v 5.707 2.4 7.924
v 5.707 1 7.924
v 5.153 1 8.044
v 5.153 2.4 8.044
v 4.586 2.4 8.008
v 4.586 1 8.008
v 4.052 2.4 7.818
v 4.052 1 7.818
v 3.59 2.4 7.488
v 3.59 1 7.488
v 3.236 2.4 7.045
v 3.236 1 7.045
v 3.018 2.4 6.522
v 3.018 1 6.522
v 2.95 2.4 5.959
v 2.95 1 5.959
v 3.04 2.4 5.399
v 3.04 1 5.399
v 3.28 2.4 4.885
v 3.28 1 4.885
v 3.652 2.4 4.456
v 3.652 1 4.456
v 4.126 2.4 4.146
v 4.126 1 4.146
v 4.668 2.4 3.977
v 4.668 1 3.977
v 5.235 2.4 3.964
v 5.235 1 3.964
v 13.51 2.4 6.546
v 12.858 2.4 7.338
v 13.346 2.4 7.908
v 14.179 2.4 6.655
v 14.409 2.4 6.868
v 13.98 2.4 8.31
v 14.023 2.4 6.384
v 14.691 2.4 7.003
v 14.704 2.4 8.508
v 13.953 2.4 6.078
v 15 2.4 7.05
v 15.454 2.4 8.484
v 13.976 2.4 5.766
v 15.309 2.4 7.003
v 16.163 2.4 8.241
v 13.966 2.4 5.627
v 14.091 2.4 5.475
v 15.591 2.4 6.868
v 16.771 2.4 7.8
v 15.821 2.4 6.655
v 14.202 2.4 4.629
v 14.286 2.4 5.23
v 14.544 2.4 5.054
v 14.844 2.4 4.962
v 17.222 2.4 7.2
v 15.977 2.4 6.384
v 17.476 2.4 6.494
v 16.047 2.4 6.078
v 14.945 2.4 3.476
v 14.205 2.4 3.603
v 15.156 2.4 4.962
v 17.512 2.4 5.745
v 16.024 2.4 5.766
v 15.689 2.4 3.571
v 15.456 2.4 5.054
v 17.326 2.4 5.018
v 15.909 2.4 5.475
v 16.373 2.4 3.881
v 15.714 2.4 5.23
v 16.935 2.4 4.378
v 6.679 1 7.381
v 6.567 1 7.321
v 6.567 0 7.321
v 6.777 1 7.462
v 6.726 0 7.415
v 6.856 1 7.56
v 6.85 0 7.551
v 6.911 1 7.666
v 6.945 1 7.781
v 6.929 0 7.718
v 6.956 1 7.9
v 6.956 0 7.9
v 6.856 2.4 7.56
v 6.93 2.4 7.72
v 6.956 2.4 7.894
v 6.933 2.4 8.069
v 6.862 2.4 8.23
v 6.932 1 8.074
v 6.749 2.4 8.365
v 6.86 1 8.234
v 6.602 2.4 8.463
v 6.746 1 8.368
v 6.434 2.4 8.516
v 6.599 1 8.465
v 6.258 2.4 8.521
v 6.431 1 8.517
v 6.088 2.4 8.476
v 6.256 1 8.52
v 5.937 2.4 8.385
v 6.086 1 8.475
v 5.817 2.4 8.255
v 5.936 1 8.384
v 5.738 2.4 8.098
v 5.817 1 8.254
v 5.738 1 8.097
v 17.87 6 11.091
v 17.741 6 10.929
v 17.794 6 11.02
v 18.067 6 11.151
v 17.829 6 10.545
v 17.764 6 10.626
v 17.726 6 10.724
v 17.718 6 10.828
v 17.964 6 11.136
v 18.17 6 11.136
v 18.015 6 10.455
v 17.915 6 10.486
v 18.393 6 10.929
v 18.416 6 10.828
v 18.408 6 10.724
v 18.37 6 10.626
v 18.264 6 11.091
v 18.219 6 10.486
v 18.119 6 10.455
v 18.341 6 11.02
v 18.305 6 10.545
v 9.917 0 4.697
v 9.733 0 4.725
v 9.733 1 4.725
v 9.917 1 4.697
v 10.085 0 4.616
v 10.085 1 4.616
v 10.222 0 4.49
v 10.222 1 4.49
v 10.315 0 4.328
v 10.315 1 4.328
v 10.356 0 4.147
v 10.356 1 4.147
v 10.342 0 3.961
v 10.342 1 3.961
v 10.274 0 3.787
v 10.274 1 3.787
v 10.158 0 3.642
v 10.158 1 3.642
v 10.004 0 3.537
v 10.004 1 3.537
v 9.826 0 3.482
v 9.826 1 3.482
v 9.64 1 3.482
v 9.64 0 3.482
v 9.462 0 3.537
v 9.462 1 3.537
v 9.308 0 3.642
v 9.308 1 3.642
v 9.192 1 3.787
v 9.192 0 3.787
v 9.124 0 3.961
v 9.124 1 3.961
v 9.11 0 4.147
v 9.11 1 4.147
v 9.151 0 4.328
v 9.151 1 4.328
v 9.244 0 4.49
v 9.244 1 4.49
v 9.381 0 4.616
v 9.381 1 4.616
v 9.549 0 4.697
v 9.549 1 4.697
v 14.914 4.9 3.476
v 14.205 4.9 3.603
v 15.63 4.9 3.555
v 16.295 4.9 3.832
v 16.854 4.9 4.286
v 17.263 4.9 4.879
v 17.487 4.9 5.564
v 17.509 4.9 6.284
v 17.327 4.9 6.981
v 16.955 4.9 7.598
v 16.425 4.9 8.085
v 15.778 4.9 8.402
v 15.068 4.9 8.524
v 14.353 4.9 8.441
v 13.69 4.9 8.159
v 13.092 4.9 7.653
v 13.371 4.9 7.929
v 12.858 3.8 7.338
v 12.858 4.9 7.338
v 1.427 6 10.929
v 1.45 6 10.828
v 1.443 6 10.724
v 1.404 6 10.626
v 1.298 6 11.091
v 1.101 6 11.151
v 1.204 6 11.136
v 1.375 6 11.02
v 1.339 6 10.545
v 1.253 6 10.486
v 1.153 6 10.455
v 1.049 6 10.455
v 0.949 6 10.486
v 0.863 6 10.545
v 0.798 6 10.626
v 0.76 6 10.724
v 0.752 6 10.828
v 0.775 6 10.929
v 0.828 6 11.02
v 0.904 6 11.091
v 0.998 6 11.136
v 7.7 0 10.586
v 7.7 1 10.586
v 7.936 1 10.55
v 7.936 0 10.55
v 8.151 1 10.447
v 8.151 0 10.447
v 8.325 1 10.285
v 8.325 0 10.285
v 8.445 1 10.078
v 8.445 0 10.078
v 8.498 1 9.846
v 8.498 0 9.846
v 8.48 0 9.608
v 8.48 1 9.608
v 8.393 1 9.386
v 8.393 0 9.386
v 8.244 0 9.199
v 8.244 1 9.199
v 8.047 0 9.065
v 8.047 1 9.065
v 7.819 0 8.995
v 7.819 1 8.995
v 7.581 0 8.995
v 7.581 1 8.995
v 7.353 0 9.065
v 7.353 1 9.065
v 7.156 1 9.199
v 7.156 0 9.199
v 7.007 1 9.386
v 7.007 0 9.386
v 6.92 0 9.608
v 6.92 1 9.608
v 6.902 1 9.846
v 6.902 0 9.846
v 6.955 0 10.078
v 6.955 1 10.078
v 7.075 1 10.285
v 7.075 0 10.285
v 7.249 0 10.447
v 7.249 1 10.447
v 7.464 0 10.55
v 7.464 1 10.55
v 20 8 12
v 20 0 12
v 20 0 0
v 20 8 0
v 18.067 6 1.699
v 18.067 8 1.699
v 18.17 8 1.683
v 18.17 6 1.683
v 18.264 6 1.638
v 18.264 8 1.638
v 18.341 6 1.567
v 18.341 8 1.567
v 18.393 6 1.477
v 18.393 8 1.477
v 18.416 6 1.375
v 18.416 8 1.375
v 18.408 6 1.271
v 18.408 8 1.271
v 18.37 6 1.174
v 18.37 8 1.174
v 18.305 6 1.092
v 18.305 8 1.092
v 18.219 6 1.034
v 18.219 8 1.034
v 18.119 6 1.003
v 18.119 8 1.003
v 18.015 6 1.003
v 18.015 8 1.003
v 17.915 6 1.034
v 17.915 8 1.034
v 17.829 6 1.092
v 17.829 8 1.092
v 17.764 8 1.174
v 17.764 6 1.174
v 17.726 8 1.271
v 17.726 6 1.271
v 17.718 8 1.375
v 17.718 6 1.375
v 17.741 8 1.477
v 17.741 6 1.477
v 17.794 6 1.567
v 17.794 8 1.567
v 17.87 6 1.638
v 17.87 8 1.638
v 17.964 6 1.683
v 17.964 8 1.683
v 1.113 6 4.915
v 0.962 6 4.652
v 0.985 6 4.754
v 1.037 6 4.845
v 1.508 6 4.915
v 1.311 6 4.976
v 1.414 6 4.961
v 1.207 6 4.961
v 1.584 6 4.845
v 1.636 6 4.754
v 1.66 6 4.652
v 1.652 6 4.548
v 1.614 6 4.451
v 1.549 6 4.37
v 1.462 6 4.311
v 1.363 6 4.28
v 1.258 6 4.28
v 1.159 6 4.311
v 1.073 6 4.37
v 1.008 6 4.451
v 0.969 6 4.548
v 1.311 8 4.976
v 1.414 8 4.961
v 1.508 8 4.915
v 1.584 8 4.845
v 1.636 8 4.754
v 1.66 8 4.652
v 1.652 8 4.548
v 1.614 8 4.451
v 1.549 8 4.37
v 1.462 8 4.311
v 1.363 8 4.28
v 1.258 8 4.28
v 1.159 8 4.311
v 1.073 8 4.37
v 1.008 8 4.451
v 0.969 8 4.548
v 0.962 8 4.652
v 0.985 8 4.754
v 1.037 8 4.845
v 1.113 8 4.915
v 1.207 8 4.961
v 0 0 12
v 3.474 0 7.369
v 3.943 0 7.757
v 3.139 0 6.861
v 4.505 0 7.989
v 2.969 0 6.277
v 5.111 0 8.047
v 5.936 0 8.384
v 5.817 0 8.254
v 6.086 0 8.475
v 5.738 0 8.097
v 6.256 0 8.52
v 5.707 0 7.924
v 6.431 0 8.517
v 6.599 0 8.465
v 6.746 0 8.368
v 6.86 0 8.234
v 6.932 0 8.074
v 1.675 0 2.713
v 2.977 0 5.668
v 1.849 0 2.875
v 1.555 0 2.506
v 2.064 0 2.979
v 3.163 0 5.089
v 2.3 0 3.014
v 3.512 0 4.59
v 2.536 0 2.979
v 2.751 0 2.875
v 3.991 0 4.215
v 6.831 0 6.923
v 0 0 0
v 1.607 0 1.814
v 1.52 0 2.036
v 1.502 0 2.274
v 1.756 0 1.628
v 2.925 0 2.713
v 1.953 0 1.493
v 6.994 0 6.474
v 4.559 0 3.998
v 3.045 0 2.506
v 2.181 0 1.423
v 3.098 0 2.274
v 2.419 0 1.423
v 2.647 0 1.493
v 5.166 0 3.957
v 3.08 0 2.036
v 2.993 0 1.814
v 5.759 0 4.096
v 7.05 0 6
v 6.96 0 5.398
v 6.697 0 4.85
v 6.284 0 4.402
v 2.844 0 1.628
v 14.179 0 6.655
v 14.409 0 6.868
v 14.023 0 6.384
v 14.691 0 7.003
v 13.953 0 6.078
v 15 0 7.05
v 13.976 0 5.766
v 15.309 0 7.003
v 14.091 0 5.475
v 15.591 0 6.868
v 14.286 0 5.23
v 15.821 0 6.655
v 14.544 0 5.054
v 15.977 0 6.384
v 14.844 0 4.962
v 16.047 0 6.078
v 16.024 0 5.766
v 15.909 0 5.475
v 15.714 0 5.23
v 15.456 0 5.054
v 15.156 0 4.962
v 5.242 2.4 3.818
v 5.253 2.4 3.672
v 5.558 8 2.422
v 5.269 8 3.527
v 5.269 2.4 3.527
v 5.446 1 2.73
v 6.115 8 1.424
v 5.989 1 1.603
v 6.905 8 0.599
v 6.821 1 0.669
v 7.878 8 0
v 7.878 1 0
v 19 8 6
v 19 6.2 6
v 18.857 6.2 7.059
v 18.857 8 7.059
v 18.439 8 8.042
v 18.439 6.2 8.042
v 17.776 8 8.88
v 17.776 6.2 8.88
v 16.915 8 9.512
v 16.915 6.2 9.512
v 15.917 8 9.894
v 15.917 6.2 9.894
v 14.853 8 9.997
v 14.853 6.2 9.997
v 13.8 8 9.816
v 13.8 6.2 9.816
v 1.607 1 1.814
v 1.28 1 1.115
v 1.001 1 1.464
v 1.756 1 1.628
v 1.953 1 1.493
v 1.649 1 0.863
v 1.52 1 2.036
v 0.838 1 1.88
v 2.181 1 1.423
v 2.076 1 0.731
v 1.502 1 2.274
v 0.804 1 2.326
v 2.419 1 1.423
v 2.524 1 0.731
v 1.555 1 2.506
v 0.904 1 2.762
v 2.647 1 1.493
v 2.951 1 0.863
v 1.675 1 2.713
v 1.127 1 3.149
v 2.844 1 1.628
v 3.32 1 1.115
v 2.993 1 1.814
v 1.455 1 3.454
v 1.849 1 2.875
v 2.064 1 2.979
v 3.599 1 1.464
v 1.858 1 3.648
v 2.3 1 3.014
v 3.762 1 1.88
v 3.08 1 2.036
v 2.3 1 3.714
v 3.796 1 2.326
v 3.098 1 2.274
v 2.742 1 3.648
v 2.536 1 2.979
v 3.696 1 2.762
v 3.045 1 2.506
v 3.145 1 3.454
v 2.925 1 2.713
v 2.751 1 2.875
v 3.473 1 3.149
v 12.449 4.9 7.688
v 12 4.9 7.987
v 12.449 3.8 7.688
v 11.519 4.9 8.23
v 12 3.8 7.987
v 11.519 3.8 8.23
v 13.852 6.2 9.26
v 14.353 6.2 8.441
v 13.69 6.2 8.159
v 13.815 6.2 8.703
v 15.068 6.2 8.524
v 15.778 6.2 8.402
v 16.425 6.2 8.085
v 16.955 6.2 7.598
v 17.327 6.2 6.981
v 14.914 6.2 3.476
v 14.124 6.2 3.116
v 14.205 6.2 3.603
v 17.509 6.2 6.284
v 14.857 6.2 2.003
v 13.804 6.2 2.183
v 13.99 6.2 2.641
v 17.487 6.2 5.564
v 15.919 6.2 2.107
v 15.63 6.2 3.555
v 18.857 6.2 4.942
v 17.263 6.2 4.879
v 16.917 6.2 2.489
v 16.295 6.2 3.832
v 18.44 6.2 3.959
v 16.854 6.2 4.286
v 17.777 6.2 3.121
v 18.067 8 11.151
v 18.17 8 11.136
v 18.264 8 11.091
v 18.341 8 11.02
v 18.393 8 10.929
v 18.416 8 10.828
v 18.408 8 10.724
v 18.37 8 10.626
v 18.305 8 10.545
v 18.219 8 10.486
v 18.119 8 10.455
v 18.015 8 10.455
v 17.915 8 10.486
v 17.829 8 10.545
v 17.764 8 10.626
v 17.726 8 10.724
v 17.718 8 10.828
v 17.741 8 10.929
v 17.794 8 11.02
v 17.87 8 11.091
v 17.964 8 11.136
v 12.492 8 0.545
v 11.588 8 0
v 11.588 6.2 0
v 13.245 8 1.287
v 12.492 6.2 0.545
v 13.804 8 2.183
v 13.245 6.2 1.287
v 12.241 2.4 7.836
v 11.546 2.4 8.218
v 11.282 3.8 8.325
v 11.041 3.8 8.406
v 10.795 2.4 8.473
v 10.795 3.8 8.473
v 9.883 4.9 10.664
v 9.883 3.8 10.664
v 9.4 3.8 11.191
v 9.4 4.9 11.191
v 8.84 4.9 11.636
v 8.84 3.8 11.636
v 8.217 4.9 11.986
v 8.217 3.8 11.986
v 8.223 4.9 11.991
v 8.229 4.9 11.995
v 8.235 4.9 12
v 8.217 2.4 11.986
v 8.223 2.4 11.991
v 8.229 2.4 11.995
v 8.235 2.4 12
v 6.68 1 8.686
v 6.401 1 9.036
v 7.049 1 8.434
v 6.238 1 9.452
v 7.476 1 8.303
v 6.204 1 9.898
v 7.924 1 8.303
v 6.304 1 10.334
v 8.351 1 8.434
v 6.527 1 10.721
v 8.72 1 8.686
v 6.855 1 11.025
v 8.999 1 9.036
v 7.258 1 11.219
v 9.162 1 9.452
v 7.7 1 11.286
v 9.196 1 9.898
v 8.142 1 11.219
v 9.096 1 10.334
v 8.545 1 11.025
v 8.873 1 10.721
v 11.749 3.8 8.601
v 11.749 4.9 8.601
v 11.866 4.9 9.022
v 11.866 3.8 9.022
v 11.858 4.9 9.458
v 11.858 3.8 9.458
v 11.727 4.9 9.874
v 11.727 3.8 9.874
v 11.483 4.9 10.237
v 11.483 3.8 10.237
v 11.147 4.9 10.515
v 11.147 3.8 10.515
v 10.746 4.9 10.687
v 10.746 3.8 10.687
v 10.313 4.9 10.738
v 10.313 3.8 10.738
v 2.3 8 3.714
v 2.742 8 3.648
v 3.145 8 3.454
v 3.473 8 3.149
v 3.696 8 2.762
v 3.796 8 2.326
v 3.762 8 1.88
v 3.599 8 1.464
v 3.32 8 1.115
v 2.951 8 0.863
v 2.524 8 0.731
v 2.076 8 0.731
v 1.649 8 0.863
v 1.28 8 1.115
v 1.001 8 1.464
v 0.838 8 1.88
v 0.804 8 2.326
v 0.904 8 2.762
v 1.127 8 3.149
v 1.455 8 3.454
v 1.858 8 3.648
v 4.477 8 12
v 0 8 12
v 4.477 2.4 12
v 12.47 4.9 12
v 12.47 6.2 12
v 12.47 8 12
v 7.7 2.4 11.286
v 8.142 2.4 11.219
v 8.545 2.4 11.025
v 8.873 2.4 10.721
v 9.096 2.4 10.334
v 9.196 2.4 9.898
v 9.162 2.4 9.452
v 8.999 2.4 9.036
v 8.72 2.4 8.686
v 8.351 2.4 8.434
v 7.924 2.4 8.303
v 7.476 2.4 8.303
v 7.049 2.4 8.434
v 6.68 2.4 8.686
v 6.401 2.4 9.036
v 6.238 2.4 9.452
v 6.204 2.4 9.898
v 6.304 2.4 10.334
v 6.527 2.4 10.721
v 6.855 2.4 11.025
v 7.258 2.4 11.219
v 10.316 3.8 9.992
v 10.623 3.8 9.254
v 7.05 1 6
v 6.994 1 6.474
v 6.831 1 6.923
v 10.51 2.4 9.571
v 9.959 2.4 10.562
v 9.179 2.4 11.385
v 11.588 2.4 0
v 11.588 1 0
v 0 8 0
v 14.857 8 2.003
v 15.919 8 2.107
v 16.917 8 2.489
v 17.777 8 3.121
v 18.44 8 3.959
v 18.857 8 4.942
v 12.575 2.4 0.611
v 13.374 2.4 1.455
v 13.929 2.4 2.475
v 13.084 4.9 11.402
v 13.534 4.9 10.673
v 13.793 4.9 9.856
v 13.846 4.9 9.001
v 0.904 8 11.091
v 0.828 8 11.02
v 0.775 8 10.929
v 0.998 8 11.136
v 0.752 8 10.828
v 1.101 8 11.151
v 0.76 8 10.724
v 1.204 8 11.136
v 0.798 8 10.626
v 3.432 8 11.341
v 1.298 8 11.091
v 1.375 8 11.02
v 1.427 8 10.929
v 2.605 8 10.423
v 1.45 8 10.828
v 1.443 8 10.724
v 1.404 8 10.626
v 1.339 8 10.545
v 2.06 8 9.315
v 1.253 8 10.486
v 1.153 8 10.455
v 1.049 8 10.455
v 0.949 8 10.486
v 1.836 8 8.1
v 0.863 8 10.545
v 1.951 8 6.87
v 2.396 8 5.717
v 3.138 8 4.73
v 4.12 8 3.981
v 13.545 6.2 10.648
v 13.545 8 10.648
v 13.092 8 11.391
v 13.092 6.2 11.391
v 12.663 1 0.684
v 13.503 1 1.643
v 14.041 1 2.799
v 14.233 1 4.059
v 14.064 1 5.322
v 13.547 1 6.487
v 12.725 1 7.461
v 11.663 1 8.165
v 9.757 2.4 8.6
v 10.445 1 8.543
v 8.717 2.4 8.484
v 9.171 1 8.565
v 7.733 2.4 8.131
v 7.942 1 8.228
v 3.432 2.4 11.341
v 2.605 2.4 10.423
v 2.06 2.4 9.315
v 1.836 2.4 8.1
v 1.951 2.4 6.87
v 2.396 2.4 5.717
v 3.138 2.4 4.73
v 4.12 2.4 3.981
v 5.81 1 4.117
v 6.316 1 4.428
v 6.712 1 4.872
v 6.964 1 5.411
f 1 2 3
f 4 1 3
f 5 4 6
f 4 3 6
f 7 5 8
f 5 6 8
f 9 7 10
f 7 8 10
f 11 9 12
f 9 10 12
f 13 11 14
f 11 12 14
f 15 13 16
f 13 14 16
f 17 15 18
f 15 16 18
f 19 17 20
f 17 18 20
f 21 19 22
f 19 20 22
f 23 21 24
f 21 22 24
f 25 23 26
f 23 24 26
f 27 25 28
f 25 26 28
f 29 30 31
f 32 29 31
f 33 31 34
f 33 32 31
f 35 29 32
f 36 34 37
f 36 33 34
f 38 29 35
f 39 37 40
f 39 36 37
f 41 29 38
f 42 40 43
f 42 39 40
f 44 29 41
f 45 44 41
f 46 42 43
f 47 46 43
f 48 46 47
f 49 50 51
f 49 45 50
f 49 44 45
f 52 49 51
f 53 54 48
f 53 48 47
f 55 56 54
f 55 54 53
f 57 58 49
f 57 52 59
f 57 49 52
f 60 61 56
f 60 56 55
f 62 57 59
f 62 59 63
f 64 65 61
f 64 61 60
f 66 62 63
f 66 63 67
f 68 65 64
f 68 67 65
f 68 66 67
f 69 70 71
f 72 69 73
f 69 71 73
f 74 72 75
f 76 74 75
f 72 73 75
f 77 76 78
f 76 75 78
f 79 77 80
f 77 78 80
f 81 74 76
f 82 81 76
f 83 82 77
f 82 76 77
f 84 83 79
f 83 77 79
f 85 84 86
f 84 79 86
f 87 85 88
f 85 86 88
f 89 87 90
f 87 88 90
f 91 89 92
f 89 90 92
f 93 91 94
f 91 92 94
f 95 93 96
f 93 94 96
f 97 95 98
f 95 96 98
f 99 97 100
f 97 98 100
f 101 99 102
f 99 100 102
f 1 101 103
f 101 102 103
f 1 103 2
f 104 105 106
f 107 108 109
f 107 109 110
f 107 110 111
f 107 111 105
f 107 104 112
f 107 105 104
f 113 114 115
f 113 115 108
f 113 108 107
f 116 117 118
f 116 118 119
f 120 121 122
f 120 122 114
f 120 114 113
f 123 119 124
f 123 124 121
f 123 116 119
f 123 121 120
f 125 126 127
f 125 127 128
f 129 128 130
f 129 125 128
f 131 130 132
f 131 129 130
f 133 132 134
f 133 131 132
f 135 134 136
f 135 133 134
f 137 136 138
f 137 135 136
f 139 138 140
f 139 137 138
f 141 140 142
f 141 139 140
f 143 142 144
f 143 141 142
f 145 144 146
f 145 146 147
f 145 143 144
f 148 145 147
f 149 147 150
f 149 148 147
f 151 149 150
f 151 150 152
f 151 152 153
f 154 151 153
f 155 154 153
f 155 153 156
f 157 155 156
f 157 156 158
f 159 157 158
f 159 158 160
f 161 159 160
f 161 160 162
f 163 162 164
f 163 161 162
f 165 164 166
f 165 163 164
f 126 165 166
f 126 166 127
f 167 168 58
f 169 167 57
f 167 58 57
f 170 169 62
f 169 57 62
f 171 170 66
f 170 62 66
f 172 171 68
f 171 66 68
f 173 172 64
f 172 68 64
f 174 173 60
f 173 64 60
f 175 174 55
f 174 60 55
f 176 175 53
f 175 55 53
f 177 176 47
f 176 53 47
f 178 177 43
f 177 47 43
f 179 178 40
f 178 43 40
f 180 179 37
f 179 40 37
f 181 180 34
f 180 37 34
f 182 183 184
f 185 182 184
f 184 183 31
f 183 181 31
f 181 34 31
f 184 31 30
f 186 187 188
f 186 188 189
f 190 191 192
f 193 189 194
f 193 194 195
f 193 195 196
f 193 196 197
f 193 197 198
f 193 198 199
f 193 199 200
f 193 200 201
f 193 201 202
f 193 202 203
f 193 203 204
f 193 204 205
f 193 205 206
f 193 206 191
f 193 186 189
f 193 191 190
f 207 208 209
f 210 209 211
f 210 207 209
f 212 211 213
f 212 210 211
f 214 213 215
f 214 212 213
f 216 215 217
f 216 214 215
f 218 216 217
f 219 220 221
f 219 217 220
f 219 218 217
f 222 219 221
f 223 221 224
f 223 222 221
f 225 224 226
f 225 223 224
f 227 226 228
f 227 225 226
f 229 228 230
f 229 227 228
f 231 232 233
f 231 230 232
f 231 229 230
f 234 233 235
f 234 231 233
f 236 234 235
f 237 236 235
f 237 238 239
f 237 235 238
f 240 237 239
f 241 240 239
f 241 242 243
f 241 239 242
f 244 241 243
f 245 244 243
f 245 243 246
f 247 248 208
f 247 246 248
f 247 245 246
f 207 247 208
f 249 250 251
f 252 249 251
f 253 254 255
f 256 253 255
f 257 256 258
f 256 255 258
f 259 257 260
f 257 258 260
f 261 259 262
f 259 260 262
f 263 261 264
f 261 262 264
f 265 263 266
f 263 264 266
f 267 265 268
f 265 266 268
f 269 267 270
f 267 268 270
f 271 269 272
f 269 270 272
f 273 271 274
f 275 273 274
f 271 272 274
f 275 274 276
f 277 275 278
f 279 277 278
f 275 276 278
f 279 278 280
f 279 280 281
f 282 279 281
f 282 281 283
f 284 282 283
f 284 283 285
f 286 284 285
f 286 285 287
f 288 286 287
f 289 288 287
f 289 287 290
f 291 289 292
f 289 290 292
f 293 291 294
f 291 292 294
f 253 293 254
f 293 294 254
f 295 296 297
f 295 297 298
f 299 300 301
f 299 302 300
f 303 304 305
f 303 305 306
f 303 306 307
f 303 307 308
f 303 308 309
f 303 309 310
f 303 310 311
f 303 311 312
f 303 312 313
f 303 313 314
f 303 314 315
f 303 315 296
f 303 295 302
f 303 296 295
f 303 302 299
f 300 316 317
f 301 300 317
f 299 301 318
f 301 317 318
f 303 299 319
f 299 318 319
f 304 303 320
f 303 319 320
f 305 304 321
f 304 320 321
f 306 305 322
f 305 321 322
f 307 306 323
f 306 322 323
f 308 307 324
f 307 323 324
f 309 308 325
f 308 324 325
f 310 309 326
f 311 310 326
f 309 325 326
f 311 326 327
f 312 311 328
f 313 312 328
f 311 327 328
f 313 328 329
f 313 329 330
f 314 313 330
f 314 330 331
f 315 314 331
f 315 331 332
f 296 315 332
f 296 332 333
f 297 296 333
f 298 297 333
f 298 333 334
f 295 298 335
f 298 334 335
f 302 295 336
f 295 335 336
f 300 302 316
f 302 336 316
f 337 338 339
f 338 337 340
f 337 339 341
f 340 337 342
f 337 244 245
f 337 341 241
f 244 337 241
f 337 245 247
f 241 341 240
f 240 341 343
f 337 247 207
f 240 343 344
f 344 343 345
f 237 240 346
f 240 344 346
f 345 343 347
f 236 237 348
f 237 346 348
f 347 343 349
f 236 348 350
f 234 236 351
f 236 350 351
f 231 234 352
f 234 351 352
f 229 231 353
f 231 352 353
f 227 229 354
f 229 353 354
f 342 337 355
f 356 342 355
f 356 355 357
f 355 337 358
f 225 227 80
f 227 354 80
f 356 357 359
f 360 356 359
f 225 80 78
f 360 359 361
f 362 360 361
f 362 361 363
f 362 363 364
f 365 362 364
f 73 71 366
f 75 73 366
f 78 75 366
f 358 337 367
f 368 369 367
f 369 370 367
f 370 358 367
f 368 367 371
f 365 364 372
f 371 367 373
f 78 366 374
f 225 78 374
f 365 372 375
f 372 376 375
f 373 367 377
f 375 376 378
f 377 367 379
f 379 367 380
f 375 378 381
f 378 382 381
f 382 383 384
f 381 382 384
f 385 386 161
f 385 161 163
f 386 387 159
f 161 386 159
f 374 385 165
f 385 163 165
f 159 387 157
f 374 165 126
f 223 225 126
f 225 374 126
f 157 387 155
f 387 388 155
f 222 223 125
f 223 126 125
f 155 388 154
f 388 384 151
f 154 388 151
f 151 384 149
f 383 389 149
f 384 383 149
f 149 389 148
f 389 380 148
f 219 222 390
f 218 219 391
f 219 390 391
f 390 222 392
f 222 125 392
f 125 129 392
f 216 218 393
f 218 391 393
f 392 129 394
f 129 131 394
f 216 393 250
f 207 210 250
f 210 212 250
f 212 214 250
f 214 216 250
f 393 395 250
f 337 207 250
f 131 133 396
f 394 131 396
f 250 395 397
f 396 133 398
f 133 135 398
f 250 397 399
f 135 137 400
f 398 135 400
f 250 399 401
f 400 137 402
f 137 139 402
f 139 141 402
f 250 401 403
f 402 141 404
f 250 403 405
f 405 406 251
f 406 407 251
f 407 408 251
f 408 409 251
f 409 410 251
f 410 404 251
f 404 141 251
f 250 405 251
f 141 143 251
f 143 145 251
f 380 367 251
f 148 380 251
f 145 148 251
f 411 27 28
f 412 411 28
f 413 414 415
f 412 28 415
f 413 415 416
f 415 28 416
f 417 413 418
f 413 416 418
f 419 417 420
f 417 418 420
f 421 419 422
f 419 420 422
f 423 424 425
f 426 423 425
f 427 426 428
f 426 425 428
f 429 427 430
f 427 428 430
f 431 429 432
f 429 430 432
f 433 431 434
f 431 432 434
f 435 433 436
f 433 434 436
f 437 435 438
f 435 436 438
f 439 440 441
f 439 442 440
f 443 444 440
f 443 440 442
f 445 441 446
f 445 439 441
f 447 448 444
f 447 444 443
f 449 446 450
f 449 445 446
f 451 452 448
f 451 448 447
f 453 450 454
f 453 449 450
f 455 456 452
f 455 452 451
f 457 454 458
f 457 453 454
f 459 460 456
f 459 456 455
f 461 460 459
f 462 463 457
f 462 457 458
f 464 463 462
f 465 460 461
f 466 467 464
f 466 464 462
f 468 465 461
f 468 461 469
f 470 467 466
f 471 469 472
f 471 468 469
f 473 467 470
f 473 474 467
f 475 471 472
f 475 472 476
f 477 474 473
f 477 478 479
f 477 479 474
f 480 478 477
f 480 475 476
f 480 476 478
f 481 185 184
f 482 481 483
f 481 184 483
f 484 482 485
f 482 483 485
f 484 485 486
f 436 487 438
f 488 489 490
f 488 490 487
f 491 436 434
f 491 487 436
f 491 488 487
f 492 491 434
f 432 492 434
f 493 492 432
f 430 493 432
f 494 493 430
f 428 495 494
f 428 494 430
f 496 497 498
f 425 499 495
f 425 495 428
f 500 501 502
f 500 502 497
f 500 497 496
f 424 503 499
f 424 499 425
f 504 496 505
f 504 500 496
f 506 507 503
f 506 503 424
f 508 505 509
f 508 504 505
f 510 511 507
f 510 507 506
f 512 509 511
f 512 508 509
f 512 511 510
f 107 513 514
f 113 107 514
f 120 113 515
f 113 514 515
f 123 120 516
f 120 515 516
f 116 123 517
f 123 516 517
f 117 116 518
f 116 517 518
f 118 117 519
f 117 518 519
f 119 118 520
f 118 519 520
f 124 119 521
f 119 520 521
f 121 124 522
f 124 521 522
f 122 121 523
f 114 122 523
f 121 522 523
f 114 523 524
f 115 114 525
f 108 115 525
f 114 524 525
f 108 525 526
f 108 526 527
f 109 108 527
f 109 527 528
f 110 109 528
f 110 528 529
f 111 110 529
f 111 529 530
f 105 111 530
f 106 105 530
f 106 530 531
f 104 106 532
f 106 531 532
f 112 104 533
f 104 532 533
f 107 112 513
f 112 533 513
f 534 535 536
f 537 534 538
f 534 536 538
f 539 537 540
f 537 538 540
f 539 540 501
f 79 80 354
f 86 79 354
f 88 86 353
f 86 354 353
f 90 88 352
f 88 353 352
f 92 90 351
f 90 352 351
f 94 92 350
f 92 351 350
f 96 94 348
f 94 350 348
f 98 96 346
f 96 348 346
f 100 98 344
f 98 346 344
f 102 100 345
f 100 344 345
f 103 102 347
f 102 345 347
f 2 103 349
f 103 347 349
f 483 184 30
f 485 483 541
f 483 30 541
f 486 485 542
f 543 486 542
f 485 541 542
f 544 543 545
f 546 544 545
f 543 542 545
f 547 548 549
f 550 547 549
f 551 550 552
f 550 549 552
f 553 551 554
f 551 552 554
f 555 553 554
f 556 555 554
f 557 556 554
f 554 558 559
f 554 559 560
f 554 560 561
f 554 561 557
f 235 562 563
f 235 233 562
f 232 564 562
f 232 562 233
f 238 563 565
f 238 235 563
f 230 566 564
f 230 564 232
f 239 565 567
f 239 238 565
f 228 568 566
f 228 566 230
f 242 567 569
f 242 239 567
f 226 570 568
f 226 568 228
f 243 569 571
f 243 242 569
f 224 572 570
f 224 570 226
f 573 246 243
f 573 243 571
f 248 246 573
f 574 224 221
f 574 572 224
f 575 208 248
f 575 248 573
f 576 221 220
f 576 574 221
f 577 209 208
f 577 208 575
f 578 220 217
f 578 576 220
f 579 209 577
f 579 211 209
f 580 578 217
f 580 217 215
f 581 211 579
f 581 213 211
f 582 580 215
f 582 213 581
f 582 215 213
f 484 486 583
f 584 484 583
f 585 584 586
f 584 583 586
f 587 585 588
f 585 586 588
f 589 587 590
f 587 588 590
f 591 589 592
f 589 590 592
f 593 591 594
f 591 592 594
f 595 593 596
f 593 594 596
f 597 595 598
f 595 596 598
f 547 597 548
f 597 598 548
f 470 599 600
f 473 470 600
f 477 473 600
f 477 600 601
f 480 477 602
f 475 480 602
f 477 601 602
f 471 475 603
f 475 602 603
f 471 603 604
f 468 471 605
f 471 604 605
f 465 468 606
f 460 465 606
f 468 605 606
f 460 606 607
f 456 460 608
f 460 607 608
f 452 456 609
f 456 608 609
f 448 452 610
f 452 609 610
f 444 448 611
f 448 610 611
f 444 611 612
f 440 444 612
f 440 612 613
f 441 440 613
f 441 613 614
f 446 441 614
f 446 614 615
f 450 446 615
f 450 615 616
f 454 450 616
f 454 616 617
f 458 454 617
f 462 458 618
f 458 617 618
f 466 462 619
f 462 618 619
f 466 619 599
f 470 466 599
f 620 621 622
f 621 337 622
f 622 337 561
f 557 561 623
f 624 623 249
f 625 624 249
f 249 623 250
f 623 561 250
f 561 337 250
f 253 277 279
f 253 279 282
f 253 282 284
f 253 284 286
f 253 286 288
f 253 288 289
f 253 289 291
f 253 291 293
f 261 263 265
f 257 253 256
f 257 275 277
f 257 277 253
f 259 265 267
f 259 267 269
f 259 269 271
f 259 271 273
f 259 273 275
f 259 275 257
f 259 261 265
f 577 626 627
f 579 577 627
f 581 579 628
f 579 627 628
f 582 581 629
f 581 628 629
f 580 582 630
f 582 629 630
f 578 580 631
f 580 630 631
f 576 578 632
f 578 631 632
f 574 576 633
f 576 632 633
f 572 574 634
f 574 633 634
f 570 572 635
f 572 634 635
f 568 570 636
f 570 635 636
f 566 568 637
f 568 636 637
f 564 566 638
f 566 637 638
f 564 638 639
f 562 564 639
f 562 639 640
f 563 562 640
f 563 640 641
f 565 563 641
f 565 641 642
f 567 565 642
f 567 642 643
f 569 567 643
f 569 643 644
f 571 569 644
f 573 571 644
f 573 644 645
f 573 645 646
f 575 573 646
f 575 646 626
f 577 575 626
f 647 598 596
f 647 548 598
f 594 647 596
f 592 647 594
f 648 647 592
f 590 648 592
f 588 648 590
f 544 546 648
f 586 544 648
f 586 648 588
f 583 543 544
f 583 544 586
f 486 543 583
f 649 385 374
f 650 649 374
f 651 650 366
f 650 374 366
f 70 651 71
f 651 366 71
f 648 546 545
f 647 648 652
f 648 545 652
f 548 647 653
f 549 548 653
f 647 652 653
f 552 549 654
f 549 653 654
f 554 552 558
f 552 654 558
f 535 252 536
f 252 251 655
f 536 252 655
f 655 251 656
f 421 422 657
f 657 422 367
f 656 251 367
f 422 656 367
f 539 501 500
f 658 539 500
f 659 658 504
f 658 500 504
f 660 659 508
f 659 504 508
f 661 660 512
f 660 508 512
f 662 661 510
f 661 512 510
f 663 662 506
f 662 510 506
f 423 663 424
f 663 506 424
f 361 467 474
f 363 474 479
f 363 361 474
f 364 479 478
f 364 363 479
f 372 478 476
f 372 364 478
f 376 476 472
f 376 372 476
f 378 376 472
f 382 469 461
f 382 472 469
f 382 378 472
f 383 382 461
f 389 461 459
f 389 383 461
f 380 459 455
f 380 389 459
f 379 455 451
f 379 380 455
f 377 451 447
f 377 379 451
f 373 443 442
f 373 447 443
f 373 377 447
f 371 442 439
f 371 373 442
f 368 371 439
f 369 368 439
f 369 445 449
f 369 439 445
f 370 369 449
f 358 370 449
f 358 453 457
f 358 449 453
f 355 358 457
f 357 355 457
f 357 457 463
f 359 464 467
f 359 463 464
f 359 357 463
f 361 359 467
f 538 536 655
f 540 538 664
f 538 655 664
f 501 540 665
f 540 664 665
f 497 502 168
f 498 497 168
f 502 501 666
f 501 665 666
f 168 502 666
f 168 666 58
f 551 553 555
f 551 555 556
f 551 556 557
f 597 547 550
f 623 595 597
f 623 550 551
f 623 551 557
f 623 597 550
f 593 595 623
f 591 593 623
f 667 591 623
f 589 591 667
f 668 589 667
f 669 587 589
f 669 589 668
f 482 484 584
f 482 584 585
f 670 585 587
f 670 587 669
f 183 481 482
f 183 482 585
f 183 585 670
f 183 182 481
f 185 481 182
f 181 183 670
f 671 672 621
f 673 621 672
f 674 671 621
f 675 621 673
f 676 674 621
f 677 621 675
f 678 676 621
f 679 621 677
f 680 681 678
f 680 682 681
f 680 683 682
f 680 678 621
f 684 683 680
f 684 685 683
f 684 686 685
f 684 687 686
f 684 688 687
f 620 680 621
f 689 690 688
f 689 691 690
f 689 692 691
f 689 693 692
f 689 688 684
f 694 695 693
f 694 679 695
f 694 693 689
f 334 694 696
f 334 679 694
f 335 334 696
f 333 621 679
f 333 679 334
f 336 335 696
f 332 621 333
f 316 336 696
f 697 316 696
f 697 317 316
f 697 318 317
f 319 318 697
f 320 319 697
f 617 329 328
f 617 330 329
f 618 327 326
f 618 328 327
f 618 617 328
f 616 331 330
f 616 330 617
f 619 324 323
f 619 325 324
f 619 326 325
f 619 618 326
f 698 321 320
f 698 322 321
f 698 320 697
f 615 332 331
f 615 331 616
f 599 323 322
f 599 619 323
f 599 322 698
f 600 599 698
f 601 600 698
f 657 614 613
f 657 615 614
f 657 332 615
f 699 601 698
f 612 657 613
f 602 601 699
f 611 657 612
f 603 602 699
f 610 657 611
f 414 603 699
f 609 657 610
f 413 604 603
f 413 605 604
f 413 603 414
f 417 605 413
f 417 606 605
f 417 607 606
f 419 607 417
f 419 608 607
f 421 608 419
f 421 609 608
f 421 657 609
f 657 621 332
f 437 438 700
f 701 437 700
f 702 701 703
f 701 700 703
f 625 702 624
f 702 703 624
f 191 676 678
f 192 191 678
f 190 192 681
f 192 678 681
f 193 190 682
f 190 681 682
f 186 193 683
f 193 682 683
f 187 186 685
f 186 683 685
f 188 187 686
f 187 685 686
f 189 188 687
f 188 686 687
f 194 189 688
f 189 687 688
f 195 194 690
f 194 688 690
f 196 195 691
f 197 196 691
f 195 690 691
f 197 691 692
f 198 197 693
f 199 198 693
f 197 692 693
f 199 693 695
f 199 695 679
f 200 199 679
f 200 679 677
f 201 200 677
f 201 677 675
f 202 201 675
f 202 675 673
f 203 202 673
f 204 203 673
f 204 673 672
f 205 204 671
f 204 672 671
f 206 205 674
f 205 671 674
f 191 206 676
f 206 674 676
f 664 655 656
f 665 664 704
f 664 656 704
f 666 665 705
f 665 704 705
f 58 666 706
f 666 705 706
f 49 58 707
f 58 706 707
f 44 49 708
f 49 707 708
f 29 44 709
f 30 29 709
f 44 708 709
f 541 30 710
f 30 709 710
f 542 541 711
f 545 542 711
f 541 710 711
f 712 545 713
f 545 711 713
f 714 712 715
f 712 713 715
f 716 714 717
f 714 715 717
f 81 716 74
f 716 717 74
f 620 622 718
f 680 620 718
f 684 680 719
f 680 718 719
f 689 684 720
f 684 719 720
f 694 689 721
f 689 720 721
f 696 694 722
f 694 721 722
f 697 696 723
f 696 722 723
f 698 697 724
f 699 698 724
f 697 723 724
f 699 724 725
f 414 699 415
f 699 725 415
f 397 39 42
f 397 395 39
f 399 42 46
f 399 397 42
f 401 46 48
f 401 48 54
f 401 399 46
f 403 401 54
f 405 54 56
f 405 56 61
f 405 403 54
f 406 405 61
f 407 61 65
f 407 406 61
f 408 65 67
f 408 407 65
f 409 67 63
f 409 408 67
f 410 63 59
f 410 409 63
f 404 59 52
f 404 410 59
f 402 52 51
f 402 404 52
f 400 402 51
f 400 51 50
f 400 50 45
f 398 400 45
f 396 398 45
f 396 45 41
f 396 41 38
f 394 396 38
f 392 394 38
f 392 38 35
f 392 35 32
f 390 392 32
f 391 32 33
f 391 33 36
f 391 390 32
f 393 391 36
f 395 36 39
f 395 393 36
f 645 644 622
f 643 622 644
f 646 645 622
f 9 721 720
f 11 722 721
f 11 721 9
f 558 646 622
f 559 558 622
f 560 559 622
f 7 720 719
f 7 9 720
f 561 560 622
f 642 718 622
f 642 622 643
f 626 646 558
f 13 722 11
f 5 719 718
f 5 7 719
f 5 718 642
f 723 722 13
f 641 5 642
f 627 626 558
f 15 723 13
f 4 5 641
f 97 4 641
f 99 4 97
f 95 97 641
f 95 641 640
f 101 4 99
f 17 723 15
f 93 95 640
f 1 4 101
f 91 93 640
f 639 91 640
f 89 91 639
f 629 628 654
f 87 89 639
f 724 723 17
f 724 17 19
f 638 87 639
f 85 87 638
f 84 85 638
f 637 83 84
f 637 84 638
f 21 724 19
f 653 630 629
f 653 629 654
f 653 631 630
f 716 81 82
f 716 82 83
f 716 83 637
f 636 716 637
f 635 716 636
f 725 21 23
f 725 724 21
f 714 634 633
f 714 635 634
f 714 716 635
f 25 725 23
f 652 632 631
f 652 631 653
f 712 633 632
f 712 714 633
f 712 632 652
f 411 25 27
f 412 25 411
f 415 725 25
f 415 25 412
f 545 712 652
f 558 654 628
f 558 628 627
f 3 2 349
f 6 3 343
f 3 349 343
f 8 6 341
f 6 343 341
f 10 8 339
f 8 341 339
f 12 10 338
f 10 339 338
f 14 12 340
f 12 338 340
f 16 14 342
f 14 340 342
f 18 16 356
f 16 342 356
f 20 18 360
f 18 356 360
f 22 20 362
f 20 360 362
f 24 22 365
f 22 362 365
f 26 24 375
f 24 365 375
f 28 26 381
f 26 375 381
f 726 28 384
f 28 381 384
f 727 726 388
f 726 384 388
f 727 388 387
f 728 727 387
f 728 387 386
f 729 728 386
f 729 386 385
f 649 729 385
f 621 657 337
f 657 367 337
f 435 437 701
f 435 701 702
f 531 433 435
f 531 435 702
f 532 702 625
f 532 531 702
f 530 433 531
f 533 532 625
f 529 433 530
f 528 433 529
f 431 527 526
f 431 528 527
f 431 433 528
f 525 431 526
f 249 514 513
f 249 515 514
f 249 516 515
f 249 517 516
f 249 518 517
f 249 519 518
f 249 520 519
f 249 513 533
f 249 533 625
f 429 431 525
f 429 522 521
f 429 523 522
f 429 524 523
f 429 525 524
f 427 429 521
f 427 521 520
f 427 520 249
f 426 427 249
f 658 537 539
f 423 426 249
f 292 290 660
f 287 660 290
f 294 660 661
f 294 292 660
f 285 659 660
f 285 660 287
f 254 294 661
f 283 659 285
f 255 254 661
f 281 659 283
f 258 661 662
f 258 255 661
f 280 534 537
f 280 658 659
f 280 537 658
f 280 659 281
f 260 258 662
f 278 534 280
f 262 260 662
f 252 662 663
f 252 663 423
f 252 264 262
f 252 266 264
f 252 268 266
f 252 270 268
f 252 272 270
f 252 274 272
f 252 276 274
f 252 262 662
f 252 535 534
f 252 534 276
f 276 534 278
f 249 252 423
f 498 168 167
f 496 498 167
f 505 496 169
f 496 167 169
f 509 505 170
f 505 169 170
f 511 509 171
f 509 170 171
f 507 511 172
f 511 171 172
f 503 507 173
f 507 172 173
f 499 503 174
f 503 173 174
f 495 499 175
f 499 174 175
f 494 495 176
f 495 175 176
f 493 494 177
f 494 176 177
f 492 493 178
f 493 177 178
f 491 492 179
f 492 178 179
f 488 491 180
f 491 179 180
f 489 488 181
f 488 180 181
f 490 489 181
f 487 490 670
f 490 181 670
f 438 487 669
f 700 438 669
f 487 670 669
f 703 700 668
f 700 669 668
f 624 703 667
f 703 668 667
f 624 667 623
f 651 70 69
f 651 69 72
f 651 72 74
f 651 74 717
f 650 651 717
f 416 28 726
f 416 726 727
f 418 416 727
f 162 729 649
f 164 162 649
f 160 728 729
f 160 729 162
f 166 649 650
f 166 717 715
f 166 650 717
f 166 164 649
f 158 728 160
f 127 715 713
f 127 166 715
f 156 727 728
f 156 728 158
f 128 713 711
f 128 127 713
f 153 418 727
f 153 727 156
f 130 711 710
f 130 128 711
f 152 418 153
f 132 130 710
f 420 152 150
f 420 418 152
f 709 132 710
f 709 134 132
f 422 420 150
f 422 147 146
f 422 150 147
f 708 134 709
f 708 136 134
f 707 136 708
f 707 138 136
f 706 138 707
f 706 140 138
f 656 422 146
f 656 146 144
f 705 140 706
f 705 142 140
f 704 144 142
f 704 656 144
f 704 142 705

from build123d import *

# Parameters (mm, degrees)
SKETCH_1_W           = 20
SKETCH_1_H           = 12
SKETCH_1_R           = 0.625
SKETCH_1_R_2         = 1.05
EXTRUDE_1_DEPTH      = 1
SKETCH_3_R           = 1.05
EXTRUDE_5_DEPTH      = 1.4
EXTRUDE_START        = 1.4
EXTRUDE_6_DEPTH      = 1.4
EXTRUDE_START_2      = 2.8
EXTRUDE_7_DEPTH      = 1.1
EXTRUDE_START_3      = 3.9
EXTRUDE_8_DEPTH      = 1.3
EXTRUDE_START_4      = 5.2
EXTRUDE_9_DEPTH      = 1.8
SKETCH_5_R           = 0.8
CUT_EXTRUDE_9_DEPTH  = 25.657656012
CUT_EXTRUDE_START    = 8
SKETCH_5_7_R         = 1.5
CUT_EXTRUDE_10_DEPTH = 7
SKETCH_6_R           = 0.35
CUT_EXTRUDE_11_DEPTH = 2


with BuildPart() as part:
    # 草图1 → 凸台-拉伸1 (new body)
    with BuildSketch(Plane(origin=(0, 0, 0), x_dir=(1, 0, 0), z_dir=(0, 1, 0))):
        with Locations((10, -6)):
            Rectangle(SKETCH_1_W, SKETCH_1_H)
        with BuildLine():
            ThreePointArc((5.706865228, -7.92427689), (3.318992309, -4.826665802), (7.05, -6))
            ThreePointArc((7.05, -6), (6.925573765, -6.70332473), (6.567399341, -7.321271852))
            ThreePointArc((6.567399341, -7.321271852), (6.850107647, -7.55134445), (6.956393556, -7.9))
            ThreePointArc((6.956393556, -7.9), (6.343534292, -8.524882071), (5.706865228, -7.92427689))
        make_face(mode=Mode.SUBTRACT)
        with Locations(Location((9.732863826, -4.1, 0), (0, 0, 270))):
            Circle(SKETCH_1_R, mode=Mode.SUBTRACT)
        with Locations(Location((15, -6, 0), (0, 0, 270))):
            Circle(SKETCH_1_R_2, mode=Mode.SUBTRACT)
    extrude(amount=EXTRUDE_1_DEPTH)

    # 草图3 → 凸台-拉伸5 (add)
    with BuildSketch(Plane(origin=(0, 1, 0), x_dir=(1, 0, 0), z_dir=(0, 1, 0))):
        with BuildLine():
            Line((7.878140127, 0), (0, 0))
            Line((0, 0), (0, -12))
            Line((0, -12), (20, -12))
            Line((20, -12), (20, 0))
            Line((20, 0), (11.587587526, 0))
            ThreePointArc((11.587587526, 0), (13.547414344, -6.487300641), (6.856030701, -7.560322408))
            ThreePointArc((6.856030701, -7.560322408), (6.520100415, -8.495831118), (5.706865228, -7.92427689))
            ThreePointArc((5.706865228, -7.92427689), (2.964398818, -6.24254449), (5.234934356, -3.963506482))
            ThreePointArc((5.234934356, -3.963506482), (5.989016009, -1.60328145), (7.878140127, 0))
        make_face()
        with Locations(Location((15, -6, 0), (0, 0, 270))):
            Circle(SKETCH_3_R, mode=Mode.SUBTRACT)
    extrude(amount=EXTRUDE_5_DEPTH)

    # 草图3<11> → 凸台-拉伸6 (add)
    with BuildSketch(Plane(origin=(0, 1, 0), x_dir=(1, 0, 0), z_dir=(0, 1, 0)).offset(EXTRUDE_START)):
        with BuildLine():
            Line((7.878140127, 0), (0, 0))
            Line((0, 0), (0, -12))
            Line((0, -12), (4.476669857, -12))
            ThreePointArc((4.476669857, -12), (1.850964776, -7.48076505), (5.2694824, -3.527089677))
            ThreePointArc((5.2694824, -3.527089677), (6.1148943, -1.424126963), (7.878140127, 0))
        make_face()
        with BuildLine():
            Line((20, 0), (11.587587526, 0))
            ThreePointArc((11.587587526, 0), (13.37352153, -1.455078171), (14.205367203, -3.603297324))
            ThreePointArc((14.205367203, -3.603297324), (17.375189654, -6.856795836), (12.858337915, -7.337500846))
            ThreePointArc((12.858337915, -7.337500846), (11.902158059, -8.042608595), (10.794774983, -8.472910323))
            ThreePointArc((10.794774983, -8.472910323), (9.959364954, -10.562296665), (8.216792734, -11.985984574))
            ThreePointArc((8.216792734, -11.985984574), (8.225940362, -11.993007377), (8.235111081, -12))
            Line((8.235111081, -12), (20, -12))
            Line((20, -12), (20, 0))
        make_face()
    extrude(amount=EXTRUDE_6_DEPTH)

    # 草图3<12> → 凸台-拉伸7 (add)
    with BuildSketch(Plane(origin=(0, 1, 0), x_dir=(1, 0, 0), z_dir=(0, 1, 0)).offset(EXTRUDE_START_2)):
        with BuildLine():
            Line((7.878140127, 0), (0, 0))
            Line((0, 0), (0, -12))
            Line((0, -12), (4.476669857, -12))
            ThreePointArc((4.476669857, -12), (1.850964776, -7.48076505), (5.2694824, -3.527089677))
            ThreePointArc((5.2694824, -3.527089677), (6.1148943, -1.424126963), (7.878140127, 0))
        make_face()
        with BuildLine():
            Line((20, 0), (11.587587526, 0))
            ThreePointArc((11.587587526, 0), (13.37352153, -1.455078171), (14.205367203, -3.603297324))
            ThreePointArc((14.205367203, -3.603297324), (17.375189654, -6.856795836), (12.858337915, -7.337500846))
            ThreePointArc((12.858337915, -7.337500846), (12.228802722, -7.844367641), (11.518753038, -8.230447884))
            ThreePointArc((11.518753038, -8.230447884), (11.618245347, -10.06420032), (9.882502664, -10.663986994))
            ThreePointArc((9.882502664, -10.663986994), (9.128861159, -11.424794322), (8.216792734, -11.985984574))
            ThreePointArc((8.216792734, -11.985984574), (8.225940362, -11.993007377), (8.235111081, -12))
            Line((8.235111081, -12), (20, -12))
            Line((20, -12), (20, 0))
        make_face()
    extrude(amount=EXTRUDE_7_DEPTH)

    # 草图3<13> → 凸台-拉伸8 (add)
    with BuildSketch(Plane(origin=(0, 1, 0), x_dir=(1, 0, 0), z_dir=(0, 1, 0)).offset(EXTRUDE_START_3)):
        with BuildLine():
            Line((7.878140127, 0), (0, 0))
            Line((0, 0), (0, -12))
            Line((0, -12), (4.476669857, -12))
            ThreePointArc((4.476669857, -12), (1.850964776, -7.48076505), (5.2694824, -3.527089677))
            ThreePointArc((5.2694824, -3.527089677), (6.1148943, -1.424126963), (7.878140127, 0))
        make_face()
        with BuildLine():
            Line((20, 0), (11.587587526, 0))
            ThreePointArc((11.587587526, 0), (13.37352153, -1.455078171), (14.205367203, -3.603297324))
            ThreePointArc((14.205367203, -3.603297324), (17.508995457, -6.283842911), (13.690024431, -8.158608118))
            ThreePointArc((13.690024431, -8.158608118), (13.688592195, -10.272489181), (12.470314077, -12))
            Line((12.470314077, -12), (20, -12))
            Line((20, -12), (20, 0))
        make_face()
    extrude(amount=EXTRUDE_8_DEPTH)

    # 草图3<14> → 凸台-拉伸9 (add)
    with BuildSketch(Plane(origin=(0, 1, 0), x_dir=(1, 0, 0), z_dir=(0, 1, 0)).offset(EXTRUDE_START_4)):
        with BuildLine():
            Line((7.878140127, 0), (0, 0))
            Line((0, 0), (0, -12))
            Line((0, -12), (4.476669857, -12))
            ThreePointArc((4.476669857, -12), (1.850964776, -7.48076505), (5.2694824, -3.527089677))
            ThreePointArc((5.2694824, -3.527089677), (6.1148943, -1.424126963), (7.878140127, 0))
        make_face()
        with BuildLine():
            Line((20, 0), (11.587587526, 0))
            ThreePointArc((11.587587526, 0), (12.890484565, -0.893844784), (13.804097772, -2.182956922))
            ThreePointArc((13.804097772, -2.182956922), (17.368162905, -2.776367816), (19, -6))
            ThreePointArc((19, -6), (17.366620176, -9.224764943), (13.80044553, -9.81589689))
            ThreePointArc((13.80044553, -9.81589689), (13.341995684, -11.033778714), (12.470314077, -12))
            Line((12.470314077, -12), (20, -12))
            Line((20, -12), (20, 0))
        make_face()
    extrude(amount=EXTRUDE_9_DEPTH)

    # 草图5 → 切除-拉伸9 (cut, through all)
    with BuildSketch(Plane(origin=(0, 0, 0), x_dir=(1, 0, 0), z_dir=(0, 1, 0))):
        with Locations(Location((2.3, -2.214171161, 0), (0, 0, 270))):
            Circle(SKETCH_5_R)
        with Locations(Location((7.7, -9.785828839, 0), (0, 0, 270))):
            Circle(SKETCH_5_R)
    extrude(amount=CUT_EXTRUDE_9_DEPTH, mode=Mode.SUBTRACT)

    # 草图5<7> → 切除-拉伸10 (cut)
    with BuildSketch(Plane(origin=(0, 0, 0), x_dir=(1, 0, 0), z_dir=(0, 1, 0)).offset(CUT_EXTRUDE_START)):
        with Locations(Location((2.3, -2.214171161, 0), (0, 0, 270))):
            Circle(SKETCH_5_7_R)
        with Locations(Location((7.7, -9.785828839, 0), (0, 0, 270))):
            Circle(SKETCH_5_7_R)
    extrude(amount=-CUT_EXTRUDE_10_DEPTH, mode=Mode.SUBTRACT)

    # 草图6 → 切除-拉伸11 (cut)
    with BuildSketch(Plane(origin=(0, 8, 0), x_dir=(1, 0, 0), z_dir=(0, 1, 0))):
        with Locations(Location((18.067159924, -1.34892989, 0), (0, 0, 270))):
            Circle(SKETCH_6_R)
        with Locations(Location((18.067159924, -10.801482832, 0), (0, 0, 270))):
            Circle(SKETCH_6_R)
        with Locations(Location((1.310630289, -4.626278754, 0), (0, 0, 270))):
            Circle(SKETCH_6_R)
        with Locations(Location((1.101301337, -10.801482832, 0), (0, 0, 270))):
            Circle(SKETCH_6_R)
    extrude(amount=-CUT_EXTRUDE_11_DEPTH, mode=Mode.SUBTRACT)


solid = part.part
